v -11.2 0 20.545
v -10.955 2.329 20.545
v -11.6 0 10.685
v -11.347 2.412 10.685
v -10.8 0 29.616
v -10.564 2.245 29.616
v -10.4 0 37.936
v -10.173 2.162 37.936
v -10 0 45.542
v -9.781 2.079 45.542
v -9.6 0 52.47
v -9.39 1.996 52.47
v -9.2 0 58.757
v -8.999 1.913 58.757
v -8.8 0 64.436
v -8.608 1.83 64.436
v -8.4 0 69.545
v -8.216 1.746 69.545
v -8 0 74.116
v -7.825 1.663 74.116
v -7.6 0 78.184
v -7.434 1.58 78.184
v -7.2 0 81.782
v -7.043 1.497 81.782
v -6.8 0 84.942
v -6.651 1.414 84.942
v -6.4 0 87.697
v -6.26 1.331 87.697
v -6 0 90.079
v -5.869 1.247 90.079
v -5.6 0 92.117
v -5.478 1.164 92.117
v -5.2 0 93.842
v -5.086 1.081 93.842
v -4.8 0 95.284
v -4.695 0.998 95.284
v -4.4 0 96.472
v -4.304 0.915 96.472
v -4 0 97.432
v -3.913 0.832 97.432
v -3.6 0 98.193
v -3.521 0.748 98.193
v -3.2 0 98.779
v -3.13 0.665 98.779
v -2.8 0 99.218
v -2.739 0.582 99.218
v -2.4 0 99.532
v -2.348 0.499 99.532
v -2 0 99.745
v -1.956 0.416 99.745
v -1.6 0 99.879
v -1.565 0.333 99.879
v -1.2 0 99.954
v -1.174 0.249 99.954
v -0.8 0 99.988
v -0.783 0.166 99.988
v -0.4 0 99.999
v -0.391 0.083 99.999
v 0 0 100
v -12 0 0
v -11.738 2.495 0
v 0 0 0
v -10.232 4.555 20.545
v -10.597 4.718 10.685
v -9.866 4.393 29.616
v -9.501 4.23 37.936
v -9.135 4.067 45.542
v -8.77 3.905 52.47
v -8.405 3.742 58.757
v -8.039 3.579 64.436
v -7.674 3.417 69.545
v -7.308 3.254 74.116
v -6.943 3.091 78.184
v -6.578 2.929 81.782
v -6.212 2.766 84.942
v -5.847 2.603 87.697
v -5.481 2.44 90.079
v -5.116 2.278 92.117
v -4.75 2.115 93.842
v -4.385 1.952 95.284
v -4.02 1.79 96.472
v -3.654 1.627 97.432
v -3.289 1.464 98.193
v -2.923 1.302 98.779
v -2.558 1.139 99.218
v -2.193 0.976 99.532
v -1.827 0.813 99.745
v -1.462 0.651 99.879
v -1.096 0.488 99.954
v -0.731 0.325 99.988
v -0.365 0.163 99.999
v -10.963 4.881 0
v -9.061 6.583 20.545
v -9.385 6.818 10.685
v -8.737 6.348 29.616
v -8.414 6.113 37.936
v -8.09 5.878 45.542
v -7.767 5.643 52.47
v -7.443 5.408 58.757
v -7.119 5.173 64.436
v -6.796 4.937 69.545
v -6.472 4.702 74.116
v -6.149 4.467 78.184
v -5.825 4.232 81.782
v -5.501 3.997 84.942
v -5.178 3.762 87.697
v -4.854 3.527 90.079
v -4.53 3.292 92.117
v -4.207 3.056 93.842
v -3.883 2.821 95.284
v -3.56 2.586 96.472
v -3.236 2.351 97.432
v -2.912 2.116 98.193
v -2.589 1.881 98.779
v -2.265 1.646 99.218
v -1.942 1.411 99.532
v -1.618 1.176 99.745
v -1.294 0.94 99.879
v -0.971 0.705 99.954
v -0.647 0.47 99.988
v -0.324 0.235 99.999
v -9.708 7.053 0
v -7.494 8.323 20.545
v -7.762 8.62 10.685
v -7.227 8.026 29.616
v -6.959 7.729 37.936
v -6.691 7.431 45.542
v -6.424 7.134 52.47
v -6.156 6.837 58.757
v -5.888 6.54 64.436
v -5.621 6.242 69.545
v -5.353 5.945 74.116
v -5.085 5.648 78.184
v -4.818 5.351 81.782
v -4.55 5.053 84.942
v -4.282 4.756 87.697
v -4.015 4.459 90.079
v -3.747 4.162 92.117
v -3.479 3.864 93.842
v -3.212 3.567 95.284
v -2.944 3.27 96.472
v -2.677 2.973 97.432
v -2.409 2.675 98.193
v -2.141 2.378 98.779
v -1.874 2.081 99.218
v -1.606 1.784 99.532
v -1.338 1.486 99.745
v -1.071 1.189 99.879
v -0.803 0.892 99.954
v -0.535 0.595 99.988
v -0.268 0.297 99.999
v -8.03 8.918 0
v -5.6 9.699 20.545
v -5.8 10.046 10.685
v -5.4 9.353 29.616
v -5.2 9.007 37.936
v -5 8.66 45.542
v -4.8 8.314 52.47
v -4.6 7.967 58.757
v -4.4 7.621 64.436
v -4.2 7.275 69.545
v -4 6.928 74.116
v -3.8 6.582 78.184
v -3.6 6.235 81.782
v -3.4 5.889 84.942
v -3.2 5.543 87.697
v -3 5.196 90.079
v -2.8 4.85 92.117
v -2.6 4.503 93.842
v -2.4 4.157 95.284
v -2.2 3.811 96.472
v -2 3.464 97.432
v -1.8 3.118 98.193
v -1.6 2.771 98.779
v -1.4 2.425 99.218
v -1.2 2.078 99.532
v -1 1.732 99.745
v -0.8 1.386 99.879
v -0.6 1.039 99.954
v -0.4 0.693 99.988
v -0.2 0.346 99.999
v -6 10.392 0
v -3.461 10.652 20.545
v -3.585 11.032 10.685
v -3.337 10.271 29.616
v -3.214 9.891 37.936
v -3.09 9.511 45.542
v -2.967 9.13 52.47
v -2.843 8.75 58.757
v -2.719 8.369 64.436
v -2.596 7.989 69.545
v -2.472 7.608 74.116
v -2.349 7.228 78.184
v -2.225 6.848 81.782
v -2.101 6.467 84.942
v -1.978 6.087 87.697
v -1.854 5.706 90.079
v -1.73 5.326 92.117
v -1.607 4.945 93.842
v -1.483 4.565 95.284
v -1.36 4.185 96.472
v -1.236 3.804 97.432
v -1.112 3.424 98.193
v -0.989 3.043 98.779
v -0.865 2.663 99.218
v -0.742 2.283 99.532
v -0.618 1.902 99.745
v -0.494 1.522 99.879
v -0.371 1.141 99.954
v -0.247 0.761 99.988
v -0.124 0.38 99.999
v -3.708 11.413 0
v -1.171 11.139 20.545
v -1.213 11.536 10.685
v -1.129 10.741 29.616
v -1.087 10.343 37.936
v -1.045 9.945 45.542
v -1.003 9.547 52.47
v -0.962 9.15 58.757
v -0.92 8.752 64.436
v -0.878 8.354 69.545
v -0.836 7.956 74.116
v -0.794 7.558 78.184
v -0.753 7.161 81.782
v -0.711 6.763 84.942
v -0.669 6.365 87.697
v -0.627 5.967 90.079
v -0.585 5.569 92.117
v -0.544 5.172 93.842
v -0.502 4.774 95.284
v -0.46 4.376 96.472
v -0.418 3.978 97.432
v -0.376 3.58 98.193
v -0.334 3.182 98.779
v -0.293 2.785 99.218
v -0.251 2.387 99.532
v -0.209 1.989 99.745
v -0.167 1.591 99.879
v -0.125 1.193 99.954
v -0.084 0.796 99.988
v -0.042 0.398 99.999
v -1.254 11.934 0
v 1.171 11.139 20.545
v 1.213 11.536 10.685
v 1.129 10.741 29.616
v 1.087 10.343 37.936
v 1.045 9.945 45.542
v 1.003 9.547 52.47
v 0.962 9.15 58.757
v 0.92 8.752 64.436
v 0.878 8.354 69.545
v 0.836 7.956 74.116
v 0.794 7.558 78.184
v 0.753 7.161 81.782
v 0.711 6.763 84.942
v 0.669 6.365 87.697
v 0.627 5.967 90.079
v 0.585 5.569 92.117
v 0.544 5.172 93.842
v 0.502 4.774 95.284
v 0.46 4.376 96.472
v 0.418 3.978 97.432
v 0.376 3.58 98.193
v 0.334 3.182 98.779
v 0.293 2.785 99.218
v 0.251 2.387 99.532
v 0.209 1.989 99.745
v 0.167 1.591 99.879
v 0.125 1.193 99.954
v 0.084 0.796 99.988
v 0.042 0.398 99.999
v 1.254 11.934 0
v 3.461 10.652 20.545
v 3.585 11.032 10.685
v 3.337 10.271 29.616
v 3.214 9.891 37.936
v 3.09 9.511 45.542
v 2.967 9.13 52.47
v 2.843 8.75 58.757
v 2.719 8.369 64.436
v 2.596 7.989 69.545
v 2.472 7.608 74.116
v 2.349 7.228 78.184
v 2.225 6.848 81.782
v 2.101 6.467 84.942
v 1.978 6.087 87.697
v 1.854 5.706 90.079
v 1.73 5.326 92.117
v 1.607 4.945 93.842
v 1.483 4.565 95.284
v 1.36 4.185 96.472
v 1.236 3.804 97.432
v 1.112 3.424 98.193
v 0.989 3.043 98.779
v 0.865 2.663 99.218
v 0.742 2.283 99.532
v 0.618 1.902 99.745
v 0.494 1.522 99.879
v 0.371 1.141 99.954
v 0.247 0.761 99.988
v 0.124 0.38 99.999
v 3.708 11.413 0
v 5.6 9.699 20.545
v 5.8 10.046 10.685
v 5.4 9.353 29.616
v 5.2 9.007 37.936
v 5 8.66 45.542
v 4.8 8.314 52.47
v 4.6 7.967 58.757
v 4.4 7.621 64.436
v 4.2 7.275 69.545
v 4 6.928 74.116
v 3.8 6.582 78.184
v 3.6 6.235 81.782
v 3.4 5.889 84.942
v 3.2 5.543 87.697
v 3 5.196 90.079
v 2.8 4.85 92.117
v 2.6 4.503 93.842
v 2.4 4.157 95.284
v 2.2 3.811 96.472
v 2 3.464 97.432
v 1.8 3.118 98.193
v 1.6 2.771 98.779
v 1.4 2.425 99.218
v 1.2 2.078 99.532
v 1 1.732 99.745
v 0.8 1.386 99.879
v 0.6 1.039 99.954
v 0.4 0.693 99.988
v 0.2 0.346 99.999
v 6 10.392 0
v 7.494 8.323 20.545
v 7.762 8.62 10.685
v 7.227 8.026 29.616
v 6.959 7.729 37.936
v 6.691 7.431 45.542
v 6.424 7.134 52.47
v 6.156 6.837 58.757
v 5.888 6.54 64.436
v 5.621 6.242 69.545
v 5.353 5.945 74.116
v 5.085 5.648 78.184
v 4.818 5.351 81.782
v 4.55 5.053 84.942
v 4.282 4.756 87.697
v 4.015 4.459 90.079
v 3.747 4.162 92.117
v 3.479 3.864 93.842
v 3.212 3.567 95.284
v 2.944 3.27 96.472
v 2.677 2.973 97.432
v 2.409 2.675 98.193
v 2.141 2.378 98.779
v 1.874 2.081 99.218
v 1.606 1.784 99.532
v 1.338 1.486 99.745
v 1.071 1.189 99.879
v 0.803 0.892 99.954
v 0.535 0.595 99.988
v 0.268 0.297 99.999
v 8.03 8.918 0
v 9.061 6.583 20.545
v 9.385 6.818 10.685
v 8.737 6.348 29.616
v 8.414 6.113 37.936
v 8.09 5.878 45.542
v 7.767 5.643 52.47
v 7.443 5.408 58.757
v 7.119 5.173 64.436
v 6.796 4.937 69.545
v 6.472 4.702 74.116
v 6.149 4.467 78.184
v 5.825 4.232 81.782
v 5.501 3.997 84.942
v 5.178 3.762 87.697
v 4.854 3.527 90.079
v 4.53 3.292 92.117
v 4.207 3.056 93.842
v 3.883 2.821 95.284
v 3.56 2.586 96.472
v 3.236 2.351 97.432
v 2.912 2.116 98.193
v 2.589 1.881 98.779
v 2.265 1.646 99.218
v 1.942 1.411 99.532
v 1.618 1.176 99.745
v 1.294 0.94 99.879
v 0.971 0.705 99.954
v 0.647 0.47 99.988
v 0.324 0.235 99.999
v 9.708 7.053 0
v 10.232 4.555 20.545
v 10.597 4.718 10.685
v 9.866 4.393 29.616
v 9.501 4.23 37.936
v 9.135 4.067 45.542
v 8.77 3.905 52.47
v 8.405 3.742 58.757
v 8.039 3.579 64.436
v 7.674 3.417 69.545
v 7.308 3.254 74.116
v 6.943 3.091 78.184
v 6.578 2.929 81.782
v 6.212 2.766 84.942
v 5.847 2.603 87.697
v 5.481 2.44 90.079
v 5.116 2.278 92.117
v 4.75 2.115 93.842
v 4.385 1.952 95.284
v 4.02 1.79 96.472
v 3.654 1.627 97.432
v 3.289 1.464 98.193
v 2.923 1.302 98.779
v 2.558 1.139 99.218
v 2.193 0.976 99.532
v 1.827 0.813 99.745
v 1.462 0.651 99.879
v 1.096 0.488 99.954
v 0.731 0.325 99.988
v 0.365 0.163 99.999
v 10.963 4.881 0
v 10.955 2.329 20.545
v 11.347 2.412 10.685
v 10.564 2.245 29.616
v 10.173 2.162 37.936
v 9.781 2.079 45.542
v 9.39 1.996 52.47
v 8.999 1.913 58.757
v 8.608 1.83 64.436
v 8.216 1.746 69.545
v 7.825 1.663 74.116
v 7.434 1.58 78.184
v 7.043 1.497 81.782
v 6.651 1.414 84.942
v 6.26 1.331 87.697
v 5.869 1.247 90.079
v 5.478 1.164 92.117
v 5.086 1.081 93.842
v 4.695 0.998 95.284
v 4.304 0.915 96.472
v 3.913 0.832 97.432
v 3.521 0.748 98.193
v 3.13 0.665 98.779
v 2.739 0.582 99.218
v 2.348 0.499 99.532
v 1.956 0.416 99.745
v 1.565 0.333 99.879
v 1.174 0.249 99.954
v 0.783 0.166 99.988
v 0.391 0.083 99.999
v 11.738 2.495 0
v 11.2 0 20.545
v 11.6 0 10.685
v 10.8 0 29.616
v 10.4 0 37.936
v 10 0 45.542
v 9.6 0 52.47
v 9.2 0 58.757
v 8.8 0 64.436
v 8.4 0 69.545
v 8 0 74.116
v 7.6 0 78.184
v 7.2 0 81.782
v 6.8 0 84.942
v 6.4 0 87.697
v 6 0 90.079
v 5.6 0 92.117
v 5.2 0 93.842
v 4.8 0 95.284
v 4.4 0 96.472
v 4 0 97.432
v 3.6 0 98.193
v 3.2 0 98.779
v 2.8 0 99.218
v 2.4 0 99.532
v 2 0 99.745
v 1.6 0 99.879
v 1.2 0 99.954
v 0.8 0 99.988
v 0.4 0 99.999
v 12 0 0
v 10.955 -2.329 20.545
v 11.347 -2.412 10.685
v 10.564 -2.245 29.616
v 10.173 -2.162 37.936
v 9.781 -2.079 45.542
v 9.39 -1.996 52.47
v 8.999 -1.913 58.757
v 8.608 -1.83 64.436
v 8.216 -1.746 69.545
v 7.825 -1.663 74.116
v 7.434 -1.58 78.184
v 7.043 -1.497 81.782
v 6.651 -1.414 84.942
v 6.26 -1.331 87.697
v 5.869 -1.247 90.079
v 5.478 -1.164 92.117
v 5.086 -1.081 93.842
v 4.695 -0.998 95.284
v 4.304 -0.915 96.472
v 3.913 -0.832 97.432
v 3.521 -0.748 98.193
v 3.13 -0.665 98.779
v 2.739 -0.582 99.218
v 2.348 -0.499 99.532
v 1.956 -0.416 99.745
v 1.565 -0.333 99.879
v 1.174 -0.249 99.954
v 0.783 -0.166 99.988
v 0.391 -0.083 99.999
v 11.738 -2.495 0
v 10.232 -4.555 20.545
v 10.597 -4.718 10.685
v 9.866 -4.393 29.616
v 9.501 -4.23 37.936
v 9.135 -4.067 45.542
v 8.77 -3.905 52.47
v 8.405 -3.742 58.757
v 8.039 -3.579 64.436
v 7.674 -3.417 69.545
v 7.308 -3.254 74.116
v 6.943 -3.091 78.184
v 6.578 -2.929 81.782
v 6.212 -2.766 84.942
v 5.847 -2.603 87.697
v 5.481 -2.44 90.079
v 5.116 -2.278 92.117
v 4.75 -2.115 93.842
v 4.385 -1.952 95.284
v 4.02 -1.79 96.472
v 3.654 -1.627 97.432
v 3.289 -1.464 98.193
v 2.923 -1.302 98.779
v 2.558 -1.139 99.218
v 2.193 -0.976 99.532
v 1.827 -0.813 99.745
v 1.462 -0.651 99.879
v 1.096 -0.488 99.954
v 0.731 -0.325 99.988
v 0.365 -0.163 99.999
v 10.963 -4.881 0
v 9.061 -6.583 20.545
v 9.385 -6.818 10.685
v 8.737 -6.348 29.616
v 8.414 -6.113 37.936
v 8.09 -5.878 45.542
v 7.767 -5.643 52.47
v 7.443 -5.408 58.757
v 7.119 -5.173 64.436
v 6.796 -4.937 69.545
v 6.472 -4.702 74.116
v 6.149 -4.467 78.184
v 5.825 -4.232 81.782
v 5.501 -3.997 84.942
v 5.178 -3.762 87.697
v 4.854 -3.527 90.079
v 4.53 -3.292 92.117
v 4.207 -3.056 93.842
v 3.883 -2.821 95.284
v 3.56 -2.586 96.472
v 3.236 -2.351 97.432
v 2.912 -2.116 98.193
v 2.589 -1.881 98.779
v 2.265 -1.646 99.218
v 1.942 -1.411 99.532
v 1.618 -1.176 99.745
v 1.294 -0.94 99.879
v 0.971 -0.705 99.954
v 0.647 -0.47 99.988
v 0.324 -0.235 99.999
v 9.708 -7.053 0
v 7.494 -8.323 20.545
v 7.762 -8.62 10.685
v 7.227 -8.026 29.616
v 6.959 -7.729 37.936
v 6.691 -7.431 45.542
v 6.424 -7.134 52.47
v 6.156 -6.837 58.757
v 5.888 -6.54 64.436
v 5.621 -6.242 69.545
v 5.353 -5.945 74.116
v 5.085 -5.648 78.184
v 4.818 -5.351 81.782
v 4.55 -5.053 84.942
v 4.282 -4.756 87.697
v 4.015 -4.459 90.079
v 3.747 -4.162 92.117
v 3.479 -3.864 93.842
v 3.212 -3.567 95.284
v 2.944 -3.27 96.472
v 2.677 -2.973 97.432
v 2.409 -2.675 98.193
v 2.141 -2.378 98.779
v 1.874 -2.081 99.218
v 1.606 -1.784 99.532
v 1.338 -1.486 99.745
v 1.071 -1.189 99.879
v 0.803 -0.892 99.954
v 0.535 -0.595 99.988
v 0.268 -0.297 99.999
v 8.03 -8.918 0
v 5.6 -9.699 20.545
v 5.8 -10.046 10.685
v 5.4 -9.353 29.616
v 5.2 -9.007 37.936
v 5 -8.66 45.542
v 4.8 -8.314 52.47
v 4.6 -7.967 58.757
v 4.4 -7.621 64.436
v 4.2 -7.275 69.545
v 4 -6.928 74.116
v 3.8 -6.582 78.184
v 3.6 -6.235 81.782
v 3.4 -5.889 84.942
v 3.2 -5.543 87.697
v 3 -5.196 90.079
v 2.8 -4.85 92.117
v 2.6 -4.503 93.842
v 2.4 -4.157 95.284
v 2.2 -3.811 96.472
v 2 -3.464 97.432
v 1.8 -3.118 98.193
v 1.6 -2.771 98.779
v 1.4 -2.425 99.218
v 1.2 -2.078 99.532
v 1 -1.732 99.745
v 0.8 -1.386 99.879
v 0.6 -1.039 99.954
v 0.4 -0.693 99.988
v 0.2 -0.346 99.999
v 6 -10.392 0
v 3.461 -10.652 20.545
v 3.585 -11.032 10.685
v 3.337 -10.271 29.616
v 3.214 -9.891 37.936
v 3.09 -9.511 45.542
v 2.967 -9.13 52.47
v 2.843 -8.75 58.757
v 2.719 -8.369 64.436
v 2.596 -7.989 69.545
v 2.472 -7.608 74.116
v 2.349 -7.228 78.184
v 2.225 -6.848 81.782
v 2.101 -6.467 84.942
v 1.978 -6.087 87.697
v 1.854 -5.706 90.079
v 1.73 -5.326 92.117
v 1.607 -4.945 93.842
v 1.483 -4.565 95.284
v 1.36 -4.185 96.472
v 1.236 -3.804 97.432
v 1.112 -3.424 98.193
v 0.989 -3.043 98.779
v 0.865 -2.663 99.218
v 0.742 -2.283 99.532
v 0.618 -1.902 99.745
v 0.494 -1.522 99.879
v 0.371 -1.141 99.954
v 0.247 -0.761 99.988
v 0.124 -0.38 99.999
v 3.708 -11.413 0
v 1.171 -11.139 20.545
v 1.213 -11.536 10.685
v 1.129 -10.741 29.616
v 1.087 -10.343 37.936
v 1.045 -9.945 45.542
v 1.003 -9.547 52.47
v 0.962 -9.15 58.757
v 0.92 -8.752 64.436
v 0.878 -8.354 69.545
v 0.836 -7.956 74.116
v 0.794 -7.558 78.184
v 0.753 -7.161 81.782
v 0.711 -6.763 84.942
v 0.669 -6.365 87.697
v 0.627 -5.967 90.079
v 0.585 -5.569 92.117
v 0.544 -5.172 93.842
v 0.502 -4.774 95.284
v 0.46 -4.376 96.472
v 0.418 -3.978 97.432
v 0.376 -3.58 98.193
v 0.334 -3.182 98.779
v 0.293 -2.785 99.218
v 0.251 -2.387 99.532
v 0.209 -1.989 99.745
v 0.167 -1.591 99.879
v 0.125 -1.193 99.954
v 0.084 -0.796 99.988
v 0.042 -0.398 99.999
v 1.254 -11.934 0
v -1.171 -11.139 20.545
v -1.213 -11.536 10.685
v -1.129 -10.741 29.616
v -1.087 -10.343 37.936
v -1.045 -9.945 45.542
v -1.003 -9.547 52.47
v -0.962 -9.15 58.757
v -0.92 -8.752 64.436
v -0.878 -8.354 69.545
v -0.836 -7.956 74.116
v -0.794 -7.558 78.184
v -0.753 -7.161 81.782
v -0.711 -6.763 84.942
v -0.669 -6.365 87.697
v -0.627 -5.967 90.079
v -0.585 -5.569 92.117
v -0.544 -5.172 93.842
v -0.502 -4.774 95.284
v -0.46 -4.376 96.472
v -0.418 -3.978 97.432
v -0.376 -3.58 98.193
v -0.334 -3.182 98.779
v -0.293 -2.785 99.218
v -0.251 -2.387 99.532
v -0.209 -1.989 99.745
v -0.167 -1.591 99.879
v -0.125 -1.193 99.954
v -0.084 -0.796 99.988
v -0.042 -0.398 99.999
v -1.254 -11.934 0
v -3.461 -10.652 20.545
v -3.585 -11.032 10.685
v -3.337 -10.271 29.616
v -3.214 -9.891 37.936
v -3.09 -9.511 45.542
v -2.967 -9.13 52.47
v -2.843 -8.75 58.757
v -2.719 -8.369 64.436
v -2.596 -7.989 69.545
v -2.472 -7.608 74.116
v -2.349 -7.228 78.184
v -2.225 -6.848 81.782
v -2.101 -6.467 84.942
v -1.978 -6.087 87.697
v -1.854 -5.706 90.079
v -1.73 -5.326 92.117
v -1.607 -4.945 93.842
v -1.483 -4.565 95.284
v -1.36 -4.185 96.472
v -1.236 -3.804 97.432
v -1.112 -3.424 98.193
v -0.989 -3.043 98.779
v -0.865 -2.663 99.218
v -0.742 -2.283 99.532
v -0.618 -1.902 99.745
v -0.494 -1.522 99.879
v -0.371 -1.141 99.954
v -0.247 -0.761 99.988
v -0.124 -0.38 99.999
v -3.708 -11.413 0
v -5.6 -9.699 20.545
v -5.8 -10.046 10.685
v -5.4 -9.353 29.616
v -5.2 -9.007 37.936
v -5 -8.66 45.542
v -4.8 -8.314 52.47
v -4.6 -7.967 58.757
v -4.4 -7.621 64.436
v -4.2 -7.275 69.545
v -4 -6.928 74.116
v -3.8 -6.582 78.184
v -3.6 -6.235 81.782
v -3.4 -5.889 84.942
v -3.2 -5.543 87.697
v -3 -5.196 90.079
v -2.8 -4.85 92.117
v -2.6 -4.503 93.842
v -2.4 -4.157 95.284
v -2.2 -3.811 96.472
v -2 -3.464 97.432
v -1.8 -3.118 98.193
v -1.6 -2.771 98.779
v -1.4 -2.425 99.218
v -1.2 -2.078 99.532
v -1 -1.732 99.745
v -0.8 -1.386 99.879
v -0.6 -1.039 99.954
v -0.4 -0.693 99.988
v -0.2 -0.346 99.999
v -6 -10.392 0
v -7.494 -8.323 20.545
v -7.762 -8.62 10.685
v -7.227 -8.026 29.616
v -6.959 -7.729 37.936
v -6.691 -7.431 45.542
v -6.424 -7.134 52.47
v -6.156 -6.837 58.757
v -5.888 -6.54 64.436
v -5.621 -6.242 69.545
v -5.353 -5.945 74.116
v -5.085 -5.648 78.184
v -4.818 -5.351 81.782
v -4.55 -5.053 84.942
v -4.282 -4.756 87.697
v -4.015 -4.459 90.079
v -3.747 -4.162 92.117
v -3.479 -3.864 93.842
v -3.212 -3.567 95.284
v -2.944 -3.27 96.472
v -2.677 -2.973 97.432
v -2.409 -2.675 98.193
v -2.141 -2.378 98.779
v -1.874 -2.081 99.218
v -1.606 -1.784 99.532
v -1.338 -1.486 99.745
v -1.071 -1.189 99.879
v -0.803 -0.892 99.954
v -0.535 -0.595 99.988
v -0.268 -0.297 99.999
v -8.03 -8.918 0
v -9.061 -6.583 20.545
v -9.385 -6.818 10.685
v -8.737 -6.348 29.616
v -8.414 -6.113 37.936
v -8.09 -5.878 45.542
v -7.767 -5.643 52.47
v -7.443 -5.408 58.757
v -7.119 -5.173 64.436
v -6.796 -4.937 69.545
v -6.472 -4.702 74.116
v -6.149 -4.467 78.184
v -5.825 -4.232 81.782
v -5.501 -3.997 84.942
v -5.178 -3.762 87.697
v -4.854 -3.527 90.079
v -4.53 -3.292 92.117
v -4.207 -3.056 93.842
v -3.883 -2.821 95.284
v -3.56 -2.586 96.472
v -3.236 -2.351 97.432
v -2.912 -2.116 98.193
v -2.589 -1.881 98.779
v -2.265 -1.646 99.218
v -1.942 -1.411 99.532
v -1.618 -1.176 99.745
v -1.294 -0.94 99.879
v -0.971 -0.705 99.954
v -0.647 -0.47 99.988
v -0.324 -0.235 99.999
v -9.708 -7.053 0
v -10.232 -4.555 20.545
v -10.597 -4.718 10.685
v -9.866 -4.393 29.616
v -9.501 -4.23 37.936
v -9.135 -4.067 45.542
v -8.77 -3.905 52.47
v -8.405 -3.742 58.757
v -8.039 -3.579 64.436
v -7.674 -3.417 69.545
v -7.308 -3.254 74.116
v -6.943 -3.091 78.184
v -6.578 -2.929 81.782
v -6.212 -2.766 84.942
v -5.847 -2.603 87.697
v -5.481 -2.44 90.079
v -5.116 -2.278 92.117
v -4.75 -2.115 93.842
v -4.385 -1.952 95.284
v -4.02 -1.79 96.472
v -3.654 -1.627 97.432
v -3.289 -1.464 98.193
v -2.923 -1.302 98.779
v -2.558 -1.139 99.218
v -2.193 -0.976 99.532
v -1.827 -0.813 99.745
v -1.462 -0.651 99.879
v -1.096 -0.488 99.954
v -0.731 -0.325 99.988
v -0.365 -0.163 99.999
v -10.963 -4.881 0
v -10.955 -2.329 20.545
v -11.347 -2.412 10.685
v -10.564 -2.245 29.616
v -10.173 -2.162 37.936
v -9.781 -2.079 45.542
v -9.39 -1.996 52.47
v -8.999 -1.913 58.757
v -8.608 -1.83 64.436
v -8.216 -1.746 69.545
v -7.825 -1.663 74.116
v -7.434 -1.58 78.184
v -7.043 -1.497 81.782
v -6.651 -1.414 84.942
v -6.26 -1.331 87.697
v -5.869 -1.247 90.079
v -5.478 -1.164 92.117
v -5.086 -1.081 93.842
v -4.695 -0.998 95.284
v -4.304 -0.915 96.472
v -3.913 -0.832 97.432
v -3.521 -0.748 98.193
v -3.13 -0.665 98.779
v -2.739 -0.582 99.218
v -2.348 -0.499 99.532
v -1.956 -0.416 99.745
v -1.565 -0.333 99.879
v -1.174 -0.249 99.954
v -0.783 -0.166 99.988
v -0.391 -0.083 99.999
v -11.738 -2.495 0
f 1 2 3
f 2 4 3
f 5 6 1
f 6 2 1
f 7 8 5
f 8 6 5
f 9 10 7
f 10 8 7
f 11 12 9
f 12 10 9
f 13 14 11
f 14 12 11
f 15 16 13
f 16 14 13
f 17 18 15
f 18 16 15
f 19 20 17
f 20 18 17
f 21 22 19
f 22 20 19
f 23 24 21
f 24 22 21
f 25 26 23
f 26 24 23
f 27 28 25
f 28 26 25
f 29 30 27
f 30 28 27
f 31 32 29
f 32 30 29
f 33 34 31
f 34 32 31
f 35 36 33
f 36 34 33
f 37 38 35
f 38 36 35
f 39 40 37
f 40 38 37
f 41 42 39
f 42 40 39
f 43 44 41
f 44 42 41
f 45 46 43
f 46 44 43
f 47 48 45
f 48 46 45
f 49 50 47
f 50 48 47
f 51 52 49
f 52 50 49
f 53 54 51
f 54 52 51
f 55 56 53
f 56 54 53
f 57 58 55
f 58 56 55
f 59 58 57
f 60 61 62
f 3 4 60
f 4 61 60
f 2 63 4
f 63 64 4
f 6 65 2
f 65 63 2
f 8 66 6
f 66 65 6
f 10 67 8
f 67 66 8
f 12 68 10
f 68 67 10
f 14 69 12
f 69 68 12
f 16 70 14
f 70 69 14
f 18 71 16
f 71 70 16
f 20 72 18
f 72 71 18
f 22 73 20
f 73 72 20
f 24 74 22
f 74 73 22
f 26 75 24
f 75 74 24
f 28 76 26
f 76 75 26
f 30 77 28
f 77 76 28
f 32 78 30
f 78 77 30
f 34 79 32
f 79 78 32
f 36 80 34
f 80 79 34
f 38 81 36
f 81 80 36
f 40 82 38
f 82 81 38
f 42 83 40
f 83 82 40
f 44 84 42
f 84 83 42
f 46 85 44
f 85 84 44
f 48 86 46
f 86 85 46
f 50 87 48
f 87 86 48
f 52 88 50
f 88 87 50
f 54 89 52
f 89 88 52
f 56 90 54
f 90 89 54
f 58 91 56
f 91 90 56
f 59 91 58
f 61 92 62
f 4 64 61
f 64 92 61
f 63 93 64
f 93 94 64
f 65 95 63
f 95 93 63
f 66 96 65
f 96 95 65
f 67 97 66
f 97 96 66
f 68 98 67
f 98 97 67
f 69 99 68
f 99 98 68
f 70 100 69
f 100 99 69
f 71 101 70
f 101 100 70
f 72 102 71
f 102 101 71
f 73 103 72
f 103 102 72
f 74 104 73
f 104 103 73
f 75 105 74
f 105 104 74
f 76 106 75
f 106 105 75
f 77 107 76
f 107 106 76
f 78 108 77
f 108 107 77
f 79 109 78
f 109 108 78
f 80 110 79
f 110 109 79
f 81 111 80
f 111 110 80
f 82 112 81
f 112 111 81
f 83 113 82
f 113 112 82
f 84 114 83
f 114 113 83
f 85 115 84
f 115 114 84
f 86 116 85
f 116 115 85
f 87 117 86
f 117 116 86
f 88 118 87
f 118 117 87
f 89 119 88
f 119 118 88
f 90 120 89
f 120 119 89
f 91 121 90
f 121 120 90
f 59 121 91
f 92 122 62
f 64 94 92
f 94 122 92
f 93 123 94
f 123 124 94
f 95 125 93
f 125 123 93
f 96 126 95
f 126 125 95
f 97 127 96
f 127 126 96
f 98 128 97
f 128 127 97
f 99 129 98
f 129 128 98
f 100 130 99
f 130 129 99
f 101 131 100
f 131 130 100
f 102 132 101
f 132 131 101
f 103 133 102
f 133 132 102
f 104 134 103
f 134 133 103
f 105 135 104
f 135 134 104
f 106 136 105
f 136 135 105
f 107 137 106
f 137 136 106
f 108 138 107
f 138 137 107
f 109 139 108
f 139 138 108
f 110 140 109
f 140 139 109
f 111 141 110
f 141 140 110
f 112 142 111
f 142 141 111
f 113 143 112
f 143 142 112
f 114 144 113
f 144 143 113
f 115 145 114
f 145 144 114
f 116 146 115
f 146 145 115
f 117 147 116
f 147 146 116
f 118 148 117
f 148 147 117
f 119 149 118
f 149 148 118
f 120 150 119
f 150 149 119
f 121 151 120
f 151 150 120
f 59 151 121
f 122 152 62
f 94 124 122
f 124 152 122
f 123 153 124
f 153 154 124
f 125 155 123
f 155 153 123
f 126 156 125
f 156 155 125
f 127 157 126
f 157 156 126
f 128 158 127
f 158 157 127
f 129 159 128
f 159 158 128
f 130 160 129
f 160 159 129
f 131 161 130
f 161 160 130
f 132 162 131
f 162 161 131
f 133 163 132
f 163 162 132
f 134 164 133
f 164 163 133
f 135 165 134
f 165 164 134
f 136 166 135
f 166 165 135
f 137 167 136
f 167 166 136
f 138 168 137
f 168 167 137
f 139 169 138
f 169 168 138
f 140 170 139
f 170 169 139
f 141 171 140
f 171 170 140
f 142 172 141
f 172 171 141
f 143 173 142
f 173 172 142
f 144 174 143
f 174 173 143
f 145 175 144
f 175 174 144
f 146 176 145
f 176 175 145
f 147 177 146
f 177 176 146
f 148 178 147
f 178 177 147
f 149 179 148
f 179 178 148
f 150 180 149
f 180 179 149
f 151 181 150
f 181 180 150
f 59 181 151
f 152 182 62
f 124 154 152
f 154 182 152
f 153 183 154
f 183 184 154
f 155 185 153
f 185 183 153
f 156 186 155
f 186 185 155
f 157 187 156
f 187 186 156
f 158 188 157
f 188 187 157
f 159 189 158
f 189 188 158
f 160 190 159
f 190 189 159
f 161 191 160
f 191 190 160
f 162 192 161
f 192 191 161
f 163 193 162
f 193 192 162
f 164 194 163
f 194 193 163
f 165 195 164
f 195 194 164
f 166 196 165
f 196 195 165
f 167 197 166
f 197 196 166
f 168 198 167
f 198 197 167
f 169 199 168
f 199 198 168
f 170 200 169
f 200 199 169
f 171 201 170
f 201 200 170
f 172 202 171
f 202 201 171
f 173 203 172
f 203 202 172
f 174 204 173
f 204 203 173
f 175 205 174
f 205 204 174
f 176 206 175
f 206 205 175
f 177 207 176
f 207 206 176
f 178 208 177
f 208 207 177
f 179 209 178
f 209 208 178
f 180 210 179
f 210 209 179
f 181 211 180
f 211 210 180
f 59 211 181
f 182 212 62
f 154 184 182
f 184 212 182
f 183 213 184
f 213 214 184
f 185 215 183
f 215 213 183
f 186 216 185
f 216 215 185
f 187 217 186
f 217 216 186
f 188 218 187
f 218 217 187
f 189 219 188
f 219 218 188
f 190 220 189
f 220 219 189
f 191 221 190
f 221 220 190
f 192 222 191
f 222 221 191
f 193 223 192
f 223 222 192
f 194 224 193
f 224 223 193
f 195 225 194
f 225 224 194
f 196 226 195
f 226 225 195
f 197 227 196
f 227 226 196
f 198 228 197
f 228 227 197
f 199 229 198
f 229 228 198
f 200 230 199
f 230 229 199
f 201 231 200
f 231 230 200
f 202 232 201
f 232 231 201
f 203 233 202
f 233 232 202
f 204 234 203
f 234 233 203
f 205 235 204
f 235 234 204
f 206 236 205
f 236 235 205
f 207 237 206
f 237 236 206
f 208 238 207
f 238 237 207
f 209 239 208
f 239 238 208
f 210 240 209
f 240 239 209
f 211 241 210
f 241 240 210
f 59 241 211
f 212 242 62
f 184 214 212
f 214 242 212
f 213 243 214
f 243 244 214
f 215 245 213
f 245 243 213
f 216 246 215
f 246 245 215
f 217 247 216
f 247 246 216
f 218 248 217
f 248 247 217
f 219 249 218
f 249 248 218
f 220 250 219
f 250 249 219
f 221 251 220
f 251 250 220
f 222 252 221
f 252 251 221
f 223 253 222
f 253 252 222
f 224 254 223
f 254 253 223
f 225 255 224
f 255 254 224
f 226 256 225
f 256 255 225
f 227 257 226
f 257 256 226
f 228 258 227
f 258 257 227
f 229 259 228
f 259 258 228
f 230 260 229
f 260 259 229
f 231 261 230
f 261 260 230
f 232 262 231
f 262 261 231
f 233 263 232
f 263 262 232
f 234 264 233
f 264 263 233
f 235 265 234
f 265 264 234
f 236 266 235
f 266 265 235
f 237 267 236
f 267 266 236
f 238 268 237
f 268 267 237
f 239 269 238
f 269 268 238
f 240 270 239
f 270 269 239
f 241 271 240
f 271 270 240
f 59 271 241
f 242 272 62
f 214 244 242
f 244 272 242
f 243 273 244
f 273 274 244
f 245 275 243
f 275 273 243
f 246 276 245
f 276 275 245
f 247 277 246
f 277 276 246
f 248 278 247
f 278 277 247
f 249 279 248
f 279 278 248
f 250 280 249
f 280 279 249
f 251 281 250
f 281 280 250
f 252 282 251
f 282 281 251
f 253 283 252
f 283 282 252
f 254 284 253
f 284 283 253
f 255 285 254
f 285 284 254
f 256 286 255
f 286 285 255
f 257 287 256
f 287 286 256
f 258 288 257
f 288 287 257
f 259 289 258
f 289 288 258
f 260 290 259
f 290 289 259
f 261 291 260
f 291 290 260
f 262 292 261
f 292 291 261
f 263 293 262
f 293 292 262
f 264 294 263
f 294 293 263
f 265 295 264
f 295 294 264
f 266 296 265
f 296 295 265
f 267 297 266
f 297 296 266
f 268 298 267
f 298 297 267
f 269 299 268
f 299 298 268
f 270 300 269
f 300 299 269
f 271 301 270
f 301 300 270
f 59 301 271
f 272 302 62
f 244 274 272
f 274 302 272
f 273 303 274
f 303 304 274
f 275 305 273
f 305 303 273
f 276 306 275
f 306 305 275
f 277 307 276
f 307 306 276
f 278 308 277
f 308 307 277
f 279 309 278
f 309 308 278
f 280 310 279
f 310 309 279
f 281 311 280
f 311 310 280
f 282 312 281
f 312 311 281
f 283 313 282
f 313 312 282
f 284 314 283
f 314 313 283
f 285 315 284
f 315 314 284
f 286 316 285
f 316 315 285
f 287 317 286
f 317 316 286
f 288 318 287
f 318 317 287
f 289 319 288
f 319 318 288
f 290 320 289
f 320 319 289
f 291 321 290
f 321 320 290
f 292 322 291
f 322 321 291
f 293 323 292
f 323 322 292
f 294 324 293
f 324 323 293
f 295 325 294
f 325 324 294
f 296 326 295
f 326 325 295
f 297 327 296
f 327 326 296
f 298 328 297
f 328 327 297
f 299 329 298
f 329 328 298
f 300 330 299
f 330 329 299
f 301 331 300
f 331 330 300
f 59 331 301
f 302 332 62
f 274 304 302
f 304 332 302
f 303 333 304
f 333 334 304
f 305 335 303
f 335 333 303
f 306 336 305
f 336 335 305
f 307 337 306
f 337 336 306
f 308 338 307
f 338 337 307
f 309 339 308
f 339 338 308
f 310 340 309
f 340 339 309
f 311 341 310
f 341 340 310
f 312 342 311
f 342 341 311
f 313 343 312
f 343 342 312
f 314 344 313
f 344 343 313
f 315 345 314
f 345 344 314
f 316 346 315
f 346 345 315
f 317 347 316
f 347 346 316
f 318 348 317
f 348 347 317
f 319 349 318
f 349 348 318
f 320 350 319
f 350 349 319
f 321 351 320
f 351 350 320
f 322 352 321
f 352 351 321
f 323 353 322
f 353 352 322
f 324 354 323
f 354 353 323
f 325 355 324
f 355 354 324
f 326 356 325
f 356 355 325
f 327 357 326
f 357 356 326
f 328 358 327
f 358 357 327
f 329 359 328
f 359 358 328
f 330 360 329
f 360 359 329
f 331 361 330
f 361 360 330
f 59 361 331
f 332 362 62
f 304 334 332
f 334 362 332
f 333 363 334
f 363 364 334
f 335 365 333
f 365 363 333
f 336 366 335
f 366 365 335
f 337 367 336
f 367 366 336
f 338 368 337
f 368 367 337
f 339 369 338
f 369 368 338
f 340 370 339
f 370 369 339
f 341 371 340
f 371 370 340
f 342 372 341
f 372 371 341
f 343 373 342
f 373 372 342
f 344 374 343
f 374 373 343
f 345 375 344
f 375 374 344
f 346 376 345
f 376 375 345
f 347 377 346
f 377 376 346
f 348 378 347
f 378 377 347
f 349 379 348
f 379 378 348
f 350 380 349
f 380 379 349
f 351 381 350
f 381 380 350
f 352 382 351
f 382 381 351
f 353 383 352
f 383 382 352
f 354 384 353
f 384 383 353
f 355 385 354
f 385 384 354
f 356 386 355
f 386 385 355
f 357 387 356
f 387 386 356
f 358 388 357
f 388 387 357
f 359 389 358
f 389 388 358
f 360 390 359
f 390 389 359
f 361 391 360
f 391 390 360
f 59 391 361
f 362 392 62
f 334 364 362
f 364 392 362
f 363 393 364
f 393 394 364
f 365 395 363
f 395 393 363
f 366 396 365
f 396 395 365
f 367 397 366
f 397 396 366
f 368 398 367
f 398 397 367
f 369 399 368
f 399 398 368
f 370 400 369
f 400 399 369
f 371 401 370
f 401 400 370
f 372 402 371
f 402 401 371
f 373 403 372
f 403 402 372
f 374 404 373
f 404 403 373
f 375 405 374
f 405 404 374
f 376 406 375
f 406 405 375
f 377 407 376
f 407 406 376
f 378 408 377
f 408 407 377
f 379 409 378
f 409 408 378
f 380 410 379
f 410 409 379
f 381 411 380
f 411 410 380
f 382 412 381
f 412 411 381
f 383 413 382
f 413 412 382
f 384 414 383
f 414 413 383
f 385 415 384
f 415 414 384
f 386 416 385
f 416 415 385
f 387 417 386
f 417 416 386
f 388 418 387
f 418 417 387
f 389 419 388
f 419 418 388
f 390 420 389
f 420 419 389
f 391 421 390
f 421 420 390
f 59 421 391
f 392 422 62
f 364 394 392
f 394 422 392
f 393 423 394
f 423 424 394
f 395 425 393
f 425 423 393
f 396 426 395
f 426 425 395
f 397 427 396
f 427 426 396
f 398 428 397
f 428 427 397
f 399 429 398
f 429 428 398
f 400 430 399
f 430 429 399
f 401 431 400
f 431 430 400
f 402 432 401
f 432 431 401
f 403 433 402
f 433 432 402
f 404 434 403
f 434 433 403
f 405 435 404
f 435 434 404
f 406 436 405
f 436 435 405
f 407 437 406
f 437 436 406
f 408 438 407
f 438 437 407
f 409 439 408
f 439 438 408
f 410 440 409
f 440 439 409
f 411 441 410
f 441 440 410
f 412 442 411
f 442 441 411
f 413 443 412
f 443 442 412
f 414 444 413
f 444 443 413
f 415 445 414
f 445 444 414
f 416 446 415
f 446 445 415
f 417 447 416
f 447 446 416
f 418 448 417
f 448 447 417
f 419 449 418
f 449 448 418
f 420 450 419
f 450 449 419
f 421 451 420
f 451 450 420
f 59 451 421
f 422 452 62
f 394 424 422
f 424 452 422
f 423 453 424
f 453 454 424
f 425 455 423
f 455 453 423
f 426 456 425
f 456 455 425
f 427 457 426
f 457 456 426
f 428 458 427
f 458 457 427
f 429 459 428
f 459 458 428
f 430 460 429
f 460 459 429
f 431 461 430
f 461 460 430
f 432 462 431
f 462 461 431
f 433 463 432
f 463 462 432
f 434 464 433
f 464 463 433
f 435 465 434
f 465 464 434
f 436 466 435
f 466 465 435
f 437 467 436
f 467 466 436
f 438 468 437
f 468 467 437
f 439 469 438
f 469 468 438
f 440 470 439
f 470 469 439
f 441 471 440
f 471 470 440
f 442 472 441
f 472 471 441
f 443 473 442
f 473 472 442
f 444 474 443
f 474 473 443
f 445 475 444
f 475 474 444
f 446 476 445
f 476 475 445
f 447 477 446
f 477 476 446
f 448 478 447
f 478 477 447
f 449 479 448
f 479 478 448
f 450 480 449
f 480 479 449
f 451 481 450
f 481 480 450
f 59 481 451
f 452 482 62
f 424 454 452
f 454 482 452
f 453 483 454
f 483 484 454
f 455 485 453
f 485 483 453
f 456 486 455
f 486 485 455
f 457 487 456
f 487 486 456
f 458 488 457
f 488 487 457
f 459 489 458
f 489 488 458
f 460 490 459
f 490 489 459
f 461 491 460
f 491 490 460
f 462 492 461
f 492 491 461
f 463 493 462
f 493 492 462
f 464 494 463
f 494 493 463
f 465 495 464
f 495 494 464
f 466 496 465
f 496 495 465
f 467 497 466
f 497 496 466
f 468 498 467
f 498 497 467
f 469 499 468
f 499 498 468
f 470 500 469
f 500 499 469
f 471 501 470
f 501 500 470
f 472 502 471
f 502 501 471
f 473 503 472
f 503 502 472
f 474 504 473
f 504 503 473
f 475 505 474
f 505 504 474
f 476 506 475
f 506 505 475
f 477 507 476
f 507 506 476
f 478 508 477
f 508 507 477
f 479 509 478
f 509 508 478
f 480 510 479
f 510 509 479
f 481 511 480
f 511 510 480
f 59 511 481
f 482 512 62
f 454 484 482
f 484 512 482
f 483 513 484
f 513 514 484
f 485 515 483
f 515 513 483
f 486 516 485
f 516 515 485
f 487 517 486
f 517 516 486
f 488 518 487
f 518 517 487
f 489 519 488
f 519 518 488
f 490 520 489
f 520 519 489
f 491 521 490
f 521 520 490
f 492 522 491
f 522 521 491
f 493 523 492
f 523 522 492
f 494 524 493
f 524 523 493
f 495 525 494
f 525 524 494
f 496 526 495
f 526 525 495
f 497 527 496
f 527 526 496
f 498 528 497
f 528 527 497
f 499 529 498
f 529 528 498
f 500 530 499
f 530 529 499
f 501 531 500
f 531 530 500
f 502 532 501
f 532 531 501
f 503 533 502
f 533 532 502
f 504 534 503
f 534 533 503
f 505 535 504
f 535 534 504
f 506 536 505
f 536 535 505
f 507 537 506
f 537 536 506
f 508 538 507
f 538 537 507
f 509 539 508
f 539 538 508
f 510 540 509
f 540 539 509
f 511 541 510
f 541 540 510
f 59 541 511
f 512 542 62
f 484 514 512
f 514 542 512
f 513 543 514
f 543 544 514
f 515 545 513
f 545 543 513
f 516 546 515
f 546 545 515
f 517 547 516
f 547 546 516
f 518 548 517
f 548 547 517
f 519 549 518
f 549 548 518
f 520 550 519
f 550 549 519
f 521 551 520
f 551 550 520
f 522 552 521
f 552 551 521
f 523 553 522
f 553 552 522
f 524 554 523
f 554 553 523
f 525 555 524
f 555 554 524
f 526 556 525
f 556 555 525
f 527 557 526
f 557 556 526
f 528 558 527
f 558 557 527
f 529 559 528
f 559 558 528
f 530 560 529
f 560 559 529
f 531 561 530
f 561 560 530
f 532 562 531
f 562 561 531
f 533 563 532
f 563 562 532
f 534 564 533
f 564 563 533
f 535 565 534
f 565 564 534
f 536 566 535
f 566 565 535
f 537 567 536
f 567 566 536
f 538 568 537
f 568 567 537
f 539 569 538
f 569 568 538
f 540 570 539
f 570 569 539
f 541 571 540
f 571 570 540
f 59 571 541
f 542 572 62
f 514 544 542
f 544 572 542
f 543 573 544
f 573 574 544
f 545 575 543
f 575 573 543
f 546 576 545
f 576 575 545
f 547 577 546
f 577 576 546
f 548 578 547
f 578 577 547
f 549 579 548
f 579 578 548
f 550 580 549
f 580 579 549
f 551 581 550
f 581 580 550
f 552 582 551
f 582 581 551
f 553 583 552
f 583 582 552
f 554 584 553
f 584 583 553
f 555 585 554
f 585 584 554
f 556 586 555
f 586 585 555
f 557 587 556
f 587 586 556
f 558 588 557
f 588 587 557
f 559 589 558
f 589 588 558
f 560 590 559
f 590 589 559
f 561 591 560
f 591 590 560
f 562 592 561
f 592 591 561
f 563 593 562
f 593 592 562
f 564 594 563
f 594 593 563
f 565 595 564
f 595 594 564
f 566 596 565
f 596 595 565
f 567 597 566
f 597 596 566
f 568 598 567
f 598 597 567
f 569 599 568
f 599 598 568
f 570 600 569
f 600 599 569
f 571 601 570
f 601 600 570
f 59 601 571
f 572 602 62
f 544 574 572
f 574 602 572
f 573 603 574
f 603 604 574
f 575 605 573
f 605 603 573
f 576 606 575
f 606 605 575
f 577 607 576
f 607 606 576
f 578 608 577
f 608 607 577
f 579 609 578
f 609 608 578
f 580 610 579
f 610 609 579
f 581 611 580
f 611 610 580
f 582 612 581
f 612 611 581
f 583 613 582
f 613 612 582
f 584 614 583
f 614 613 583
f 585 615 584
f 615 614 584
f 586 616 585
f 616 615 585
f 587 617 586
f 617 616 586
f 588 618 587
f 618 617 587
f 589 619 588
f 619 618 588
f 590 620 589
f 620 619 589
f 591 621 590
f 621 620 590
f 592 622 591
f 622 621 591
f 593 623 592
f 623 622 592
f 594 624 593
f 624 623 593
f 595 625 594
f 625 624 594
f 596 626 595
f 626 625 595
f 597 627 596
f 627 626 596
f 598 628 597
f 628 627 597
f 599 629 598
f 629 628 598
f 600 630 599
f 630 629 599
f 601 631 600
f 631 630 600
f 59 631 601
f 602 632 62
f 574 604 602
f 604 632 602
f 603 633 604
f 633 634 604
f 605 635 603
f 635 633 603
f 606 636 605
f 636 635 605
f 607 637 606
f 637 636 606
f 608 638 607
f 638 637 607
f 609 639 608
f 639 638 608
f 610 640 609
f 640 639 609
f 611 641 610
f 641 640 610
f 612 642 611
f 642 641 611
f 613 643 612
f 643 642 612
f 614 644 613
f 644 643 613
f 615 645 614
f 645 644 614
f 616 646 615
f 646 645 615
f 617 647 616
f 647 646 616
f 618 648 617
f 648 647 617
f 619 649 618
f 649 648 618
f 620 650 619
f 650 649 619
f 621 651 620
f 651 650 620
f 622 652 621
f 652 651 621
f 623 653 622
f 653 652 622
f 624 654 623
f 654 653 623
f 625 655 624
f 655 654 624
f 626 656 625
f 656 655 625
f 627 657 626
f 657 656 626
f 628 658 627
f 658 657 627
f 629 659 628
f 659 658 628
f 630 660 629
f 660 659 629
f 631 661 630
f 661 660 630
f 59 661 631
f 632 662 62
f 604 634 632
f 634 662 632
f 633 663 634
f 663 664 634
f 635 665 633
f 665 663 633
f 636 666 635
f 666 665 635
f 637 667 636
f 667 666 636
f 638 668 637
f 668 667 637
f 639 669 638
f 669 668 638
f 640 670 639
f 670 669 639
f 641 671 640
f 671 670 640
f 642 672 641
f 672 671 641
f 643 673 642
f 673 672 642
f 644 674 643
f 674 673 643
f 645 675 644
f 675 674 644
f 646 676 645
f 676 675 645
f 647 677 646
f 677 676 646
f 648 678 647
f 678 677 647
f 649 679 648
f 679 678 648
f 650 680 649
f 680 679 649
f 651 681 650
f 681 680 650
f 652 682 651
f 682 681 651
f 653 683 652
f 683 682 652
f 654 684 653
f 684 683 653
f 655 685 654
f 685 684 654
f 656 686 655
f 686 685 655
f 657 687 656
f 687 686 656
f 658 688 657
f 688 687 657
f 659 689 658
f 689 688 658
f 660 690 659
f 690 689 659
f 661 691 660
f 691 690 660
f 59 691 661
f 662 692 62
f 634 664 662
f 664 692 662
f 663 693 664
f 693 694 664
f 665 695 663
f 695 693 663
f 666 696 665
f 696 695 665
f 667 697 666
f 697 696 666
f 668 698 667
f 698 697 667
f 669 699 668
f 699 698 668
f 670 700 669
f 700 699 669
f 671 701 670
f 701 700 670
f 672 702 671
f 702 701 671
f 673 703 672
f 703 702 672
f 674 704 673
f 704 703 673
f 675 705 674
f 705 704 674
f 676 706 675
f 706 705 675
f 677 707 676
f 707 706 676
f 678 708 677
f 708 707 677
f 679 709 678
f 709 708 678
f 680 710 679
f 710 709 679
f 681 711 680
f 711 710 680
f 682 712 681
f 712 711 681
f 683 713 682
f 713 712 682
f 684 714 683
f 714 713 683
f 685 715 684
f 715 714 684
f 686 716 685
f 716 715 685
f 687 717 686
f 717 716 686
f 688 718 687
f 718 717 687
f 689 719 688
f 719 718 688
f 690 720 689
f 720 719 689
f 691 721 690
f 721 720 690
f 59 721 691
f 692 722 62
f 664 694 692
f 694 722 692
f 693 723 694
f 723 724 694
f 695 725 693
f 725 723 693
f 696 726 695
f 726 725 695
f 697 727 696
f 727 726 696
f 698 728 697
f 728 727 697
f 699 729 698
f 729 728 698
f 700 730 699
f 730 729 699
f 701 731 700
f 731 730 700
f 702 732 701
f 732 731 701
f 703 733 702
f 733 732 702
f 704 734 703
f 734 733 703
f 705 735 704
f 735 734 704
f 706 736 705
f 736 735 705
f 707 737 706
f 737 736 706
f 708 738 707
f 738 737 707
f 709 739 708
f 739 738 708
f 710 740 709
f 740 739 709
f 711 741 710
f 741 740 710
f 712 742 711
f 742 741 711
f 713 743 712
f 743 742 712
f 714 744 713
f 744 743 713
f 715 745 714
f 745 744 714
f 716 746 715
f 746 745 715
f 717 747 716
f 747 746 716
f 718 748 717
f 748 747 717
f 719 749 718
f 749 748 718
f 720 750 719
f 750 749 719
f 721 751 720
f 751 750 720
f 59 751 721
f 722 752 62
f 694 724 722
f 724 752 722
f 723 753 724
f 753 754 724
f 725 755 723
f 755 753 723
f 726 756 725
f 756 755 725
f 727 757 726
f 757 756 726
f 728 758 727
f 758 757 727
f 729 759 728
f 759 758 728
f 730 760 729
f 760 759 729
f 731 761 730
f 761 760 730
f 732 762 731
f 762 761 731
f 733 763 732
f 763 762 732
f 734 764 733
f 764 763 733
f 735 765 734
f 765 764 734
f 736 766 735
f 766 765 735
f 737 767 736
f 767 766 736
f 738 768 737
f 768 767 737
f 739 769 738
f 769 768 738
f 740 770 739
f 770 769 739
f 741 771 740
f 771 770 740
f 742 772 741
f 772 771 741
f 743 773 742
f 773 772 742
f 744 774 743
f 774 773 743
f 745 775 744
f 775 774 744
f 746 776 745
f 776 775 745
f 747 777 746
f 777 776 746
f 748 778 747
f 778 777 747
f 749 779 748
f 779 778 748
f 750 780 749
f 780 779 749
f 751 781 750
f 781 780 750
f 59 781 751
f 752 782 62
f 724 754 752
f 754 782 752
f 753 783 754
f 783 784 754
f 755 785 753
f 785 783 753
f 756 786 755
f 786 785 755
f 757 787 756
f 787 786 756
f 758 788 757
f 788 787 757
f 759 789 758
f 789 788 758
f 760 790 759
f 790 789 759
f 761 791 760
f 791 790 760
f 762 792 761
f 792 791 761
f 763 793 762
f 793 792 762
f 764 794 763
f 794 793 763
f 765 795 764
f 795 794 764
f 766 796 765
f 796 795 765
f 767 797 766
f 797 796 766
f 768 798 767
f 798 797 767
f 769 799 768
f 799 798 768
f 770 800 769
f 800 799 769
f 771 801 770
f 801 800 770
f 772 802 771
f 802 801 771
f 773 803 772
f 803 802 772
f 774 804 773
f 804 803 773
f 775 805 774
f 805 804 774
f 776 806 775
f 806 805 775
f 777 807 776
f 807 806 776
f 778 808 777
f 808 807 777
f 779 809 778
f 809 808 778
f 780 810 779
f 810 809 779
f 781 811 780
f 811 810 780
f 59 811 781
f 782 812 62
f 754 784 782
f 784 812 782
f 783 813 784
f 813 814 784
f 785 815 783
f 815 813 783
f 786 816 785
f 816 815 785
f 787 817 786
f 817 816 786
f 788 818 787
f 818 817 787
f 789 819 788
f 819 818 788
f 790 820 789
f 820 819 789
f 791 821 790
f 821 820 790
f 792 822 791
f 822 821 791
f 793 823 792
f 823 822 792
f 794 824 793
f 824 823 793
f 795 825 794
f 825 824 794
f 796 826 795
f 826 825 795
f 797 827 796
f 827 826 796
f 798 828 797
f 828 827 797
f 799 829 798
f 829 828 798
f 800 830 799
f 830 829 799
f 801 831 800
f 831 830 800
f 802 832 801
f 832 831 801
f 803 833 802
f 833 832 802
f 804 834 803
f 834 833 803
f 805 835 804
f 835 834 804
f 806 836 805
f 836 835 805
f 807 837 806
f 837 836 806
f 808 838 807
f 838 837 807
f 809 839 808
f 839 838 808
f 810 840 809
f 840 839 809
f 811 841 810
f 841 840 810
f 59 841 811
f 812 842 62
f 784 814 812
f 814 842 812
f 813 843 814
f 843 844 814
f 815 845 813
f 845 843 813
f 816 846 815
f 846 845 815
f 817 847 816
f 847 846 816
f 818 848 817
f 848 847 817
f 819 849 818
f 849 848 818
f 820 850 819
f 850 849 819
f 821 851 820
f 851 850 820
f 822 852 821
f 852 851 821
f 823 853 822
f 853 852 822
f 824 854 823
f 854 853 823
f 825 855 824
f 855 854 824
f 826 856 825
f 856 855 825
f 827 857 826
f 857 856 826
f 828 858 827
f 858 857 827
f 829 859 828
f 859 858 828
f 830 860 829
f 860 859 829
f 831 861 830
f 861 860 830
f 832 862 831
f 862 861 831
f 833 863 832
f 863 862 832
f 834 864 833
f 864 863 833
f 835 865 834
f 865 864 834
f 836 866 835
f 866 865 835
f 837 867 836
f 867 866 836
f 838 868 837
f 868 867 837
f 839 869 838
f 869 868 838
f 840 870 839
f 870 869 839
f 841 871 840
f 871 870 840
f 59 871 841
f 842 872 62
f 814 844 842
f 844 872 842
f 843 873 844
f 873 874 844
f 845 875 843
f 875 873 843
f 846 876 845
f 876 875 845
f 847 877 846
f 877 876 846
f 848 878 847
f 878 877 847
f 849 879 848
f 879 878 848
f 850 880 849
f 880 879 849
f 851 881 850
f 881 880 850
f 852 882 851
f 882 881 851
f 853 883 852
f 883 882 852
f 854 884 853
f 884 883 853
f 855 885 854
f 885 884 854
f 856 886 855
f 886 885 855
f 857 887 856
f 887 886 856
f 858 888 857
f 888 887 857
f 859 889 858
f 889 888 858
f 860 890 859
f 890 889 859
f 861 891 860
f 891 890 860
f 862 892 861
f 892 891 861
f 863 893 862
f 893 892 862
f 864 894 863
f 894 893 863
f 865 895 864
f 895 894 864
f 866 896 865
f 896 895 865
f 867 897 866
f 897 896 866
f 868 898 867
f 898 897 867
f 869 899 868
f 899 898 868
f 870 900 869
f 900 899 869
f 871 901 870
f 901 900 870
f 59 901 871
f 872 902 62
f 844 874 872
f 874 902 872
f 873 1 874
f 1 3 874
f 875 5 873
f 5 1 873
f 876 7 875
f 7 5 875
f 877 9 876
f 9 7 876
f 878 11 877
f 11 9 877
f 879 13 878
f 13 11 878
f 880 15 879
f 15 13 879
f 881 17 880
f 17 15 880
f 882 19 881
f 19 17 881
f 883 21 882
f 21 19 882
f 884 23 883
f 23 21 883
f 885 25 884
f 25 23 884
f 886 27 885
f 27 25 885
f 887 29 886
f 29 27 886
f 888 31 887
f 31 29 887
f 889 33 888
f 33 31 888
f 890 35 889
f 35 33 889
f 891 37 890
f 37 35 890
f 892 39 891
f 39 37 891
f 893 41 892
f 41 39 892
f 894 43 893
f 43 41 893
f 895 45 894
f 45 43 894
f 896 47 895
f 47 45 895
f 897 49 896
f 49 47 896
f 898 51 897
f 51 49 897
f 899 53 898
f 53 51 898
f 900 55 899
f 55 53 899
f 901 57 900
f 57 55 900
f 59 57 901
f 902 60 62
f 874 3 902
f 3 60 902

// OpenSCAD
/****************************************************************
* Power series nose cone (optimized version)
*
* y = R * (x/L)^n                              (x measured from the tip)
*   n = 1    for a cone
*   n = 0.75 for a 3/4 power
*   n = 0.5  for a 1/2 power (parabola)
*   n = 0    for a cylinder
*
* Optimization: the profile is a 2D polygon revolved by ONE
* rotate_extrude, instead of a union of stacked cylinders.
* For n < 1 the curve is vertical at the tip, so the samples are
* packed towards the tip (x = L * u^q, q = 1/n, capped at 4) instead of
* being evenly spaced: a smooth tip with the same number of segments.
*
* Orientation: base at Z = 0, tip at Z = L.
*****************************************************************/

/* ---------- parameters ---------- */
n = 0.3;               // power series exponent (0..1)
L = 100;               // nose cone length (mm)
R = 24/2;              // base radius (mm)

/* ---------- quality settings ---------- */
profileSegments = 30;  // segments along the profile
fnAround        = 30;  // segments around the axis

/* Do not modify anything after that unless you know what you are doing */

assert(n >= 0, "n must be >= 0");

q = (n > 0) ? min(4, max(1, 1/n)) : 1;   // sample clustering exponent

// Profile points [radius, z], from the base (z = 0) towards the tip
function noseProfilePoints() =
    [for (i = [0:profileSegments - 1])
        let(u = 1 - i / profileSegments, x = L * pow(u, q))
            [R * pow(x / L, n), L - x]];

// 2D half-section, closed along the axis (tip point [0, L] added here
// so that n = 0 gives a clean cylinder)
module noseProfile() {
    polygon(concat([[0, 0]], noseProfilePoints(), [[0, L]]));
}

module ogive() {
    rotate_extrude($fn = fnAround) noseProfile();
}

ogive();
